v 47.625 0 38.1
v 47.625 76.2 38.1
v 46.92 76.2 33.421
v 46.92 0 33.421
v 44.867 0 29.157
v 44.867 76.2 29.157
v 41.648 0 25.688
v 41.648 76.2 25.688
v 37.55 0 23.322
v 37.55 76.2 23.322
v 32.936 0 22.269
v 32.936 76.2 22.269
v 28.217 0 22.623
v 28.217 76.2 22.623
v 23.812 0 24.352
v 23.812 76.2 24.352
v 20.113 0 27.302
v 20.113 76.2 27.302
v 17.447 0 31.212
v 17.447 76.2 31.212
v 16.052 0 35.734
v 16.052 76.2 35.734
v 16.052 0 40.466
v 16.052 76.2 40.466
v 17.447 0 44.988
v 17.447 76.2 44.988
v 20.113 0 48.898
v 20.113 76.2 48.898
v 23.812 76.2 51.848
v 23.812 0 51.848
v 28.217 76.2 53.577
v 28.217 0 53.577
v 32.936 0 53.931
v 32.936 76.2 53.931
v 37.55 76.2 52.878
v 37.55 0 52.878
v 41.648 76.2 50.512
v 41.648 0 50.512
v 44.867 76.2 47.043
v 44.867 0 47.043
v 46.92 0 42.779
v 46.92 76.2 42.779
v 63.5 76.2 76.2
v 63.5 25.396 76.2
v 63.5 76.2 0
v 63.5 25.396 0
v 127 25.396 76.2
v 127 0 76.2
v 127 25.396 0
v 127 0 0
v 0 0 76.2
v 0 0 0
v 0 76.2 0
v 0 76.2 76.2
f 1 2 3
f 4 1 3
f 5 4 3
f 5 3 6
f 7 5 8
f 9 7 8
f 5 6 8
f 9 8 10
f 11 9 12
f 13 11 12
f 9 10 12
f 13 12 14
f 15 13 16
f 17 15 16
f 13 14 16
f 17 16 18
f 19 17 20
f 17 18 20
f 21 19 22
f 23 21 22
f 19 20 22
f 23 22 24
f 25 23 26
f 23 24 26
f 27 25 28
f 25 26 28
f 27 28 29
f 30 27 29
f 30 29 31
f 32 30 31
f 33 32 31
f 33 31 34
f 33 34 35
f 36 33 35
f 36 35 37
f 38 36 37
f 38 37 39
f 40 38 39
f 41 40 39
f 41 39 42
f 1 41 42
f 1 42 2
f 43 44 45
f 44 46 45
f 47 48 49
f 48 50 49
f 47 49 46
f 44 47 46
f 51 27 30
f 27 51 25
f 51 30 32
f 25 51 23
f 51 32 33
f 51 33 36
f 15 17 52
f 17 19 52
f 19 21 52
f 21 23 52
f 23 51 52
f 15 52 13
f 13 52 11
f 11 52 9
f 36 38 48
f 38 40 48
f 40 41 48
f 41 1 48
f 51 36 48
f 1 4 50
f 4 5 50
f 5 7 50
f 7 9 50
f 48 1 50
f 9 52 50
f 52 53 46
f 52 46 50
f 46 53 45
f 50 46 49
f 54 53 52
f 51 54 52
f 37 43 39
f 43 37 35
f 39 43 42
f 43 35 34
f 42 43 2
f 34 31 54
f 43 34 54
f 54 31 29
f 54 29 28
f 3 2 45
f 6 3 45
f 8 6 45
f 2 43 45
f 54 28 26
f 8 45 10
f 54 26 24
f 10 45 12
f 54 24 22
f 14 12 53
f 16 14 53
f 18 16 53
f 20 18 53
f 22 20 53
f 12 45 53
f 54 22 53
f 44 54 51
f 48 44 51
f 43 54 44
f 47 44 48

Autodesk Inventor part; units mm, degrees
ref_plane "YZ Plane" through (0, 0, 0) normal (1, 0, 0) x (0, 1, 0)
ref_plane "XZ Plane" through (0, 0, 0) normal (0, 1, 0) x (-1, 0, 0)
ref_plane "XY Plane" through (0, 0, 0) normal (0, 0, 1) x (1, 0, 0)
sketch "Sketch1" plane through (0, 0, 0) normal (0, 0, 1) x (1, 0, 0)
  line L0 (0, 0) -> (127, 0)
  line L1 (127, 0) -> (127, 25.3956)
  line L2 (127, 25.3956) -> (63.5, 25.3956)
  line L3 (63.5, 25.3956) -> (63.5, 76.2)
  line L4 (63.5, 76.2) -> (0, 76.2)
  line L5 (0, 76.2) -> (0, 0)
  dimension "d0" = 127
  dimension "d16" = 63.5
  dimension "d17" = 25.3956
  dimension "d18" = 76.2
extrude "Extrusion1" add sketch "Sketch1" along normal blind 76.2
sketch "Sketch2" plane through (0, 76.2, 0) normal (0, 1, 0) x (1, 0, 0)
  circle A0 centre (31.75, -38.1) radius 15.875
  dimension "d3" = 31.75
extrude "Extrusion2" cut sketch "Sketch2" against normal through all
properties part number "SamplePart"
